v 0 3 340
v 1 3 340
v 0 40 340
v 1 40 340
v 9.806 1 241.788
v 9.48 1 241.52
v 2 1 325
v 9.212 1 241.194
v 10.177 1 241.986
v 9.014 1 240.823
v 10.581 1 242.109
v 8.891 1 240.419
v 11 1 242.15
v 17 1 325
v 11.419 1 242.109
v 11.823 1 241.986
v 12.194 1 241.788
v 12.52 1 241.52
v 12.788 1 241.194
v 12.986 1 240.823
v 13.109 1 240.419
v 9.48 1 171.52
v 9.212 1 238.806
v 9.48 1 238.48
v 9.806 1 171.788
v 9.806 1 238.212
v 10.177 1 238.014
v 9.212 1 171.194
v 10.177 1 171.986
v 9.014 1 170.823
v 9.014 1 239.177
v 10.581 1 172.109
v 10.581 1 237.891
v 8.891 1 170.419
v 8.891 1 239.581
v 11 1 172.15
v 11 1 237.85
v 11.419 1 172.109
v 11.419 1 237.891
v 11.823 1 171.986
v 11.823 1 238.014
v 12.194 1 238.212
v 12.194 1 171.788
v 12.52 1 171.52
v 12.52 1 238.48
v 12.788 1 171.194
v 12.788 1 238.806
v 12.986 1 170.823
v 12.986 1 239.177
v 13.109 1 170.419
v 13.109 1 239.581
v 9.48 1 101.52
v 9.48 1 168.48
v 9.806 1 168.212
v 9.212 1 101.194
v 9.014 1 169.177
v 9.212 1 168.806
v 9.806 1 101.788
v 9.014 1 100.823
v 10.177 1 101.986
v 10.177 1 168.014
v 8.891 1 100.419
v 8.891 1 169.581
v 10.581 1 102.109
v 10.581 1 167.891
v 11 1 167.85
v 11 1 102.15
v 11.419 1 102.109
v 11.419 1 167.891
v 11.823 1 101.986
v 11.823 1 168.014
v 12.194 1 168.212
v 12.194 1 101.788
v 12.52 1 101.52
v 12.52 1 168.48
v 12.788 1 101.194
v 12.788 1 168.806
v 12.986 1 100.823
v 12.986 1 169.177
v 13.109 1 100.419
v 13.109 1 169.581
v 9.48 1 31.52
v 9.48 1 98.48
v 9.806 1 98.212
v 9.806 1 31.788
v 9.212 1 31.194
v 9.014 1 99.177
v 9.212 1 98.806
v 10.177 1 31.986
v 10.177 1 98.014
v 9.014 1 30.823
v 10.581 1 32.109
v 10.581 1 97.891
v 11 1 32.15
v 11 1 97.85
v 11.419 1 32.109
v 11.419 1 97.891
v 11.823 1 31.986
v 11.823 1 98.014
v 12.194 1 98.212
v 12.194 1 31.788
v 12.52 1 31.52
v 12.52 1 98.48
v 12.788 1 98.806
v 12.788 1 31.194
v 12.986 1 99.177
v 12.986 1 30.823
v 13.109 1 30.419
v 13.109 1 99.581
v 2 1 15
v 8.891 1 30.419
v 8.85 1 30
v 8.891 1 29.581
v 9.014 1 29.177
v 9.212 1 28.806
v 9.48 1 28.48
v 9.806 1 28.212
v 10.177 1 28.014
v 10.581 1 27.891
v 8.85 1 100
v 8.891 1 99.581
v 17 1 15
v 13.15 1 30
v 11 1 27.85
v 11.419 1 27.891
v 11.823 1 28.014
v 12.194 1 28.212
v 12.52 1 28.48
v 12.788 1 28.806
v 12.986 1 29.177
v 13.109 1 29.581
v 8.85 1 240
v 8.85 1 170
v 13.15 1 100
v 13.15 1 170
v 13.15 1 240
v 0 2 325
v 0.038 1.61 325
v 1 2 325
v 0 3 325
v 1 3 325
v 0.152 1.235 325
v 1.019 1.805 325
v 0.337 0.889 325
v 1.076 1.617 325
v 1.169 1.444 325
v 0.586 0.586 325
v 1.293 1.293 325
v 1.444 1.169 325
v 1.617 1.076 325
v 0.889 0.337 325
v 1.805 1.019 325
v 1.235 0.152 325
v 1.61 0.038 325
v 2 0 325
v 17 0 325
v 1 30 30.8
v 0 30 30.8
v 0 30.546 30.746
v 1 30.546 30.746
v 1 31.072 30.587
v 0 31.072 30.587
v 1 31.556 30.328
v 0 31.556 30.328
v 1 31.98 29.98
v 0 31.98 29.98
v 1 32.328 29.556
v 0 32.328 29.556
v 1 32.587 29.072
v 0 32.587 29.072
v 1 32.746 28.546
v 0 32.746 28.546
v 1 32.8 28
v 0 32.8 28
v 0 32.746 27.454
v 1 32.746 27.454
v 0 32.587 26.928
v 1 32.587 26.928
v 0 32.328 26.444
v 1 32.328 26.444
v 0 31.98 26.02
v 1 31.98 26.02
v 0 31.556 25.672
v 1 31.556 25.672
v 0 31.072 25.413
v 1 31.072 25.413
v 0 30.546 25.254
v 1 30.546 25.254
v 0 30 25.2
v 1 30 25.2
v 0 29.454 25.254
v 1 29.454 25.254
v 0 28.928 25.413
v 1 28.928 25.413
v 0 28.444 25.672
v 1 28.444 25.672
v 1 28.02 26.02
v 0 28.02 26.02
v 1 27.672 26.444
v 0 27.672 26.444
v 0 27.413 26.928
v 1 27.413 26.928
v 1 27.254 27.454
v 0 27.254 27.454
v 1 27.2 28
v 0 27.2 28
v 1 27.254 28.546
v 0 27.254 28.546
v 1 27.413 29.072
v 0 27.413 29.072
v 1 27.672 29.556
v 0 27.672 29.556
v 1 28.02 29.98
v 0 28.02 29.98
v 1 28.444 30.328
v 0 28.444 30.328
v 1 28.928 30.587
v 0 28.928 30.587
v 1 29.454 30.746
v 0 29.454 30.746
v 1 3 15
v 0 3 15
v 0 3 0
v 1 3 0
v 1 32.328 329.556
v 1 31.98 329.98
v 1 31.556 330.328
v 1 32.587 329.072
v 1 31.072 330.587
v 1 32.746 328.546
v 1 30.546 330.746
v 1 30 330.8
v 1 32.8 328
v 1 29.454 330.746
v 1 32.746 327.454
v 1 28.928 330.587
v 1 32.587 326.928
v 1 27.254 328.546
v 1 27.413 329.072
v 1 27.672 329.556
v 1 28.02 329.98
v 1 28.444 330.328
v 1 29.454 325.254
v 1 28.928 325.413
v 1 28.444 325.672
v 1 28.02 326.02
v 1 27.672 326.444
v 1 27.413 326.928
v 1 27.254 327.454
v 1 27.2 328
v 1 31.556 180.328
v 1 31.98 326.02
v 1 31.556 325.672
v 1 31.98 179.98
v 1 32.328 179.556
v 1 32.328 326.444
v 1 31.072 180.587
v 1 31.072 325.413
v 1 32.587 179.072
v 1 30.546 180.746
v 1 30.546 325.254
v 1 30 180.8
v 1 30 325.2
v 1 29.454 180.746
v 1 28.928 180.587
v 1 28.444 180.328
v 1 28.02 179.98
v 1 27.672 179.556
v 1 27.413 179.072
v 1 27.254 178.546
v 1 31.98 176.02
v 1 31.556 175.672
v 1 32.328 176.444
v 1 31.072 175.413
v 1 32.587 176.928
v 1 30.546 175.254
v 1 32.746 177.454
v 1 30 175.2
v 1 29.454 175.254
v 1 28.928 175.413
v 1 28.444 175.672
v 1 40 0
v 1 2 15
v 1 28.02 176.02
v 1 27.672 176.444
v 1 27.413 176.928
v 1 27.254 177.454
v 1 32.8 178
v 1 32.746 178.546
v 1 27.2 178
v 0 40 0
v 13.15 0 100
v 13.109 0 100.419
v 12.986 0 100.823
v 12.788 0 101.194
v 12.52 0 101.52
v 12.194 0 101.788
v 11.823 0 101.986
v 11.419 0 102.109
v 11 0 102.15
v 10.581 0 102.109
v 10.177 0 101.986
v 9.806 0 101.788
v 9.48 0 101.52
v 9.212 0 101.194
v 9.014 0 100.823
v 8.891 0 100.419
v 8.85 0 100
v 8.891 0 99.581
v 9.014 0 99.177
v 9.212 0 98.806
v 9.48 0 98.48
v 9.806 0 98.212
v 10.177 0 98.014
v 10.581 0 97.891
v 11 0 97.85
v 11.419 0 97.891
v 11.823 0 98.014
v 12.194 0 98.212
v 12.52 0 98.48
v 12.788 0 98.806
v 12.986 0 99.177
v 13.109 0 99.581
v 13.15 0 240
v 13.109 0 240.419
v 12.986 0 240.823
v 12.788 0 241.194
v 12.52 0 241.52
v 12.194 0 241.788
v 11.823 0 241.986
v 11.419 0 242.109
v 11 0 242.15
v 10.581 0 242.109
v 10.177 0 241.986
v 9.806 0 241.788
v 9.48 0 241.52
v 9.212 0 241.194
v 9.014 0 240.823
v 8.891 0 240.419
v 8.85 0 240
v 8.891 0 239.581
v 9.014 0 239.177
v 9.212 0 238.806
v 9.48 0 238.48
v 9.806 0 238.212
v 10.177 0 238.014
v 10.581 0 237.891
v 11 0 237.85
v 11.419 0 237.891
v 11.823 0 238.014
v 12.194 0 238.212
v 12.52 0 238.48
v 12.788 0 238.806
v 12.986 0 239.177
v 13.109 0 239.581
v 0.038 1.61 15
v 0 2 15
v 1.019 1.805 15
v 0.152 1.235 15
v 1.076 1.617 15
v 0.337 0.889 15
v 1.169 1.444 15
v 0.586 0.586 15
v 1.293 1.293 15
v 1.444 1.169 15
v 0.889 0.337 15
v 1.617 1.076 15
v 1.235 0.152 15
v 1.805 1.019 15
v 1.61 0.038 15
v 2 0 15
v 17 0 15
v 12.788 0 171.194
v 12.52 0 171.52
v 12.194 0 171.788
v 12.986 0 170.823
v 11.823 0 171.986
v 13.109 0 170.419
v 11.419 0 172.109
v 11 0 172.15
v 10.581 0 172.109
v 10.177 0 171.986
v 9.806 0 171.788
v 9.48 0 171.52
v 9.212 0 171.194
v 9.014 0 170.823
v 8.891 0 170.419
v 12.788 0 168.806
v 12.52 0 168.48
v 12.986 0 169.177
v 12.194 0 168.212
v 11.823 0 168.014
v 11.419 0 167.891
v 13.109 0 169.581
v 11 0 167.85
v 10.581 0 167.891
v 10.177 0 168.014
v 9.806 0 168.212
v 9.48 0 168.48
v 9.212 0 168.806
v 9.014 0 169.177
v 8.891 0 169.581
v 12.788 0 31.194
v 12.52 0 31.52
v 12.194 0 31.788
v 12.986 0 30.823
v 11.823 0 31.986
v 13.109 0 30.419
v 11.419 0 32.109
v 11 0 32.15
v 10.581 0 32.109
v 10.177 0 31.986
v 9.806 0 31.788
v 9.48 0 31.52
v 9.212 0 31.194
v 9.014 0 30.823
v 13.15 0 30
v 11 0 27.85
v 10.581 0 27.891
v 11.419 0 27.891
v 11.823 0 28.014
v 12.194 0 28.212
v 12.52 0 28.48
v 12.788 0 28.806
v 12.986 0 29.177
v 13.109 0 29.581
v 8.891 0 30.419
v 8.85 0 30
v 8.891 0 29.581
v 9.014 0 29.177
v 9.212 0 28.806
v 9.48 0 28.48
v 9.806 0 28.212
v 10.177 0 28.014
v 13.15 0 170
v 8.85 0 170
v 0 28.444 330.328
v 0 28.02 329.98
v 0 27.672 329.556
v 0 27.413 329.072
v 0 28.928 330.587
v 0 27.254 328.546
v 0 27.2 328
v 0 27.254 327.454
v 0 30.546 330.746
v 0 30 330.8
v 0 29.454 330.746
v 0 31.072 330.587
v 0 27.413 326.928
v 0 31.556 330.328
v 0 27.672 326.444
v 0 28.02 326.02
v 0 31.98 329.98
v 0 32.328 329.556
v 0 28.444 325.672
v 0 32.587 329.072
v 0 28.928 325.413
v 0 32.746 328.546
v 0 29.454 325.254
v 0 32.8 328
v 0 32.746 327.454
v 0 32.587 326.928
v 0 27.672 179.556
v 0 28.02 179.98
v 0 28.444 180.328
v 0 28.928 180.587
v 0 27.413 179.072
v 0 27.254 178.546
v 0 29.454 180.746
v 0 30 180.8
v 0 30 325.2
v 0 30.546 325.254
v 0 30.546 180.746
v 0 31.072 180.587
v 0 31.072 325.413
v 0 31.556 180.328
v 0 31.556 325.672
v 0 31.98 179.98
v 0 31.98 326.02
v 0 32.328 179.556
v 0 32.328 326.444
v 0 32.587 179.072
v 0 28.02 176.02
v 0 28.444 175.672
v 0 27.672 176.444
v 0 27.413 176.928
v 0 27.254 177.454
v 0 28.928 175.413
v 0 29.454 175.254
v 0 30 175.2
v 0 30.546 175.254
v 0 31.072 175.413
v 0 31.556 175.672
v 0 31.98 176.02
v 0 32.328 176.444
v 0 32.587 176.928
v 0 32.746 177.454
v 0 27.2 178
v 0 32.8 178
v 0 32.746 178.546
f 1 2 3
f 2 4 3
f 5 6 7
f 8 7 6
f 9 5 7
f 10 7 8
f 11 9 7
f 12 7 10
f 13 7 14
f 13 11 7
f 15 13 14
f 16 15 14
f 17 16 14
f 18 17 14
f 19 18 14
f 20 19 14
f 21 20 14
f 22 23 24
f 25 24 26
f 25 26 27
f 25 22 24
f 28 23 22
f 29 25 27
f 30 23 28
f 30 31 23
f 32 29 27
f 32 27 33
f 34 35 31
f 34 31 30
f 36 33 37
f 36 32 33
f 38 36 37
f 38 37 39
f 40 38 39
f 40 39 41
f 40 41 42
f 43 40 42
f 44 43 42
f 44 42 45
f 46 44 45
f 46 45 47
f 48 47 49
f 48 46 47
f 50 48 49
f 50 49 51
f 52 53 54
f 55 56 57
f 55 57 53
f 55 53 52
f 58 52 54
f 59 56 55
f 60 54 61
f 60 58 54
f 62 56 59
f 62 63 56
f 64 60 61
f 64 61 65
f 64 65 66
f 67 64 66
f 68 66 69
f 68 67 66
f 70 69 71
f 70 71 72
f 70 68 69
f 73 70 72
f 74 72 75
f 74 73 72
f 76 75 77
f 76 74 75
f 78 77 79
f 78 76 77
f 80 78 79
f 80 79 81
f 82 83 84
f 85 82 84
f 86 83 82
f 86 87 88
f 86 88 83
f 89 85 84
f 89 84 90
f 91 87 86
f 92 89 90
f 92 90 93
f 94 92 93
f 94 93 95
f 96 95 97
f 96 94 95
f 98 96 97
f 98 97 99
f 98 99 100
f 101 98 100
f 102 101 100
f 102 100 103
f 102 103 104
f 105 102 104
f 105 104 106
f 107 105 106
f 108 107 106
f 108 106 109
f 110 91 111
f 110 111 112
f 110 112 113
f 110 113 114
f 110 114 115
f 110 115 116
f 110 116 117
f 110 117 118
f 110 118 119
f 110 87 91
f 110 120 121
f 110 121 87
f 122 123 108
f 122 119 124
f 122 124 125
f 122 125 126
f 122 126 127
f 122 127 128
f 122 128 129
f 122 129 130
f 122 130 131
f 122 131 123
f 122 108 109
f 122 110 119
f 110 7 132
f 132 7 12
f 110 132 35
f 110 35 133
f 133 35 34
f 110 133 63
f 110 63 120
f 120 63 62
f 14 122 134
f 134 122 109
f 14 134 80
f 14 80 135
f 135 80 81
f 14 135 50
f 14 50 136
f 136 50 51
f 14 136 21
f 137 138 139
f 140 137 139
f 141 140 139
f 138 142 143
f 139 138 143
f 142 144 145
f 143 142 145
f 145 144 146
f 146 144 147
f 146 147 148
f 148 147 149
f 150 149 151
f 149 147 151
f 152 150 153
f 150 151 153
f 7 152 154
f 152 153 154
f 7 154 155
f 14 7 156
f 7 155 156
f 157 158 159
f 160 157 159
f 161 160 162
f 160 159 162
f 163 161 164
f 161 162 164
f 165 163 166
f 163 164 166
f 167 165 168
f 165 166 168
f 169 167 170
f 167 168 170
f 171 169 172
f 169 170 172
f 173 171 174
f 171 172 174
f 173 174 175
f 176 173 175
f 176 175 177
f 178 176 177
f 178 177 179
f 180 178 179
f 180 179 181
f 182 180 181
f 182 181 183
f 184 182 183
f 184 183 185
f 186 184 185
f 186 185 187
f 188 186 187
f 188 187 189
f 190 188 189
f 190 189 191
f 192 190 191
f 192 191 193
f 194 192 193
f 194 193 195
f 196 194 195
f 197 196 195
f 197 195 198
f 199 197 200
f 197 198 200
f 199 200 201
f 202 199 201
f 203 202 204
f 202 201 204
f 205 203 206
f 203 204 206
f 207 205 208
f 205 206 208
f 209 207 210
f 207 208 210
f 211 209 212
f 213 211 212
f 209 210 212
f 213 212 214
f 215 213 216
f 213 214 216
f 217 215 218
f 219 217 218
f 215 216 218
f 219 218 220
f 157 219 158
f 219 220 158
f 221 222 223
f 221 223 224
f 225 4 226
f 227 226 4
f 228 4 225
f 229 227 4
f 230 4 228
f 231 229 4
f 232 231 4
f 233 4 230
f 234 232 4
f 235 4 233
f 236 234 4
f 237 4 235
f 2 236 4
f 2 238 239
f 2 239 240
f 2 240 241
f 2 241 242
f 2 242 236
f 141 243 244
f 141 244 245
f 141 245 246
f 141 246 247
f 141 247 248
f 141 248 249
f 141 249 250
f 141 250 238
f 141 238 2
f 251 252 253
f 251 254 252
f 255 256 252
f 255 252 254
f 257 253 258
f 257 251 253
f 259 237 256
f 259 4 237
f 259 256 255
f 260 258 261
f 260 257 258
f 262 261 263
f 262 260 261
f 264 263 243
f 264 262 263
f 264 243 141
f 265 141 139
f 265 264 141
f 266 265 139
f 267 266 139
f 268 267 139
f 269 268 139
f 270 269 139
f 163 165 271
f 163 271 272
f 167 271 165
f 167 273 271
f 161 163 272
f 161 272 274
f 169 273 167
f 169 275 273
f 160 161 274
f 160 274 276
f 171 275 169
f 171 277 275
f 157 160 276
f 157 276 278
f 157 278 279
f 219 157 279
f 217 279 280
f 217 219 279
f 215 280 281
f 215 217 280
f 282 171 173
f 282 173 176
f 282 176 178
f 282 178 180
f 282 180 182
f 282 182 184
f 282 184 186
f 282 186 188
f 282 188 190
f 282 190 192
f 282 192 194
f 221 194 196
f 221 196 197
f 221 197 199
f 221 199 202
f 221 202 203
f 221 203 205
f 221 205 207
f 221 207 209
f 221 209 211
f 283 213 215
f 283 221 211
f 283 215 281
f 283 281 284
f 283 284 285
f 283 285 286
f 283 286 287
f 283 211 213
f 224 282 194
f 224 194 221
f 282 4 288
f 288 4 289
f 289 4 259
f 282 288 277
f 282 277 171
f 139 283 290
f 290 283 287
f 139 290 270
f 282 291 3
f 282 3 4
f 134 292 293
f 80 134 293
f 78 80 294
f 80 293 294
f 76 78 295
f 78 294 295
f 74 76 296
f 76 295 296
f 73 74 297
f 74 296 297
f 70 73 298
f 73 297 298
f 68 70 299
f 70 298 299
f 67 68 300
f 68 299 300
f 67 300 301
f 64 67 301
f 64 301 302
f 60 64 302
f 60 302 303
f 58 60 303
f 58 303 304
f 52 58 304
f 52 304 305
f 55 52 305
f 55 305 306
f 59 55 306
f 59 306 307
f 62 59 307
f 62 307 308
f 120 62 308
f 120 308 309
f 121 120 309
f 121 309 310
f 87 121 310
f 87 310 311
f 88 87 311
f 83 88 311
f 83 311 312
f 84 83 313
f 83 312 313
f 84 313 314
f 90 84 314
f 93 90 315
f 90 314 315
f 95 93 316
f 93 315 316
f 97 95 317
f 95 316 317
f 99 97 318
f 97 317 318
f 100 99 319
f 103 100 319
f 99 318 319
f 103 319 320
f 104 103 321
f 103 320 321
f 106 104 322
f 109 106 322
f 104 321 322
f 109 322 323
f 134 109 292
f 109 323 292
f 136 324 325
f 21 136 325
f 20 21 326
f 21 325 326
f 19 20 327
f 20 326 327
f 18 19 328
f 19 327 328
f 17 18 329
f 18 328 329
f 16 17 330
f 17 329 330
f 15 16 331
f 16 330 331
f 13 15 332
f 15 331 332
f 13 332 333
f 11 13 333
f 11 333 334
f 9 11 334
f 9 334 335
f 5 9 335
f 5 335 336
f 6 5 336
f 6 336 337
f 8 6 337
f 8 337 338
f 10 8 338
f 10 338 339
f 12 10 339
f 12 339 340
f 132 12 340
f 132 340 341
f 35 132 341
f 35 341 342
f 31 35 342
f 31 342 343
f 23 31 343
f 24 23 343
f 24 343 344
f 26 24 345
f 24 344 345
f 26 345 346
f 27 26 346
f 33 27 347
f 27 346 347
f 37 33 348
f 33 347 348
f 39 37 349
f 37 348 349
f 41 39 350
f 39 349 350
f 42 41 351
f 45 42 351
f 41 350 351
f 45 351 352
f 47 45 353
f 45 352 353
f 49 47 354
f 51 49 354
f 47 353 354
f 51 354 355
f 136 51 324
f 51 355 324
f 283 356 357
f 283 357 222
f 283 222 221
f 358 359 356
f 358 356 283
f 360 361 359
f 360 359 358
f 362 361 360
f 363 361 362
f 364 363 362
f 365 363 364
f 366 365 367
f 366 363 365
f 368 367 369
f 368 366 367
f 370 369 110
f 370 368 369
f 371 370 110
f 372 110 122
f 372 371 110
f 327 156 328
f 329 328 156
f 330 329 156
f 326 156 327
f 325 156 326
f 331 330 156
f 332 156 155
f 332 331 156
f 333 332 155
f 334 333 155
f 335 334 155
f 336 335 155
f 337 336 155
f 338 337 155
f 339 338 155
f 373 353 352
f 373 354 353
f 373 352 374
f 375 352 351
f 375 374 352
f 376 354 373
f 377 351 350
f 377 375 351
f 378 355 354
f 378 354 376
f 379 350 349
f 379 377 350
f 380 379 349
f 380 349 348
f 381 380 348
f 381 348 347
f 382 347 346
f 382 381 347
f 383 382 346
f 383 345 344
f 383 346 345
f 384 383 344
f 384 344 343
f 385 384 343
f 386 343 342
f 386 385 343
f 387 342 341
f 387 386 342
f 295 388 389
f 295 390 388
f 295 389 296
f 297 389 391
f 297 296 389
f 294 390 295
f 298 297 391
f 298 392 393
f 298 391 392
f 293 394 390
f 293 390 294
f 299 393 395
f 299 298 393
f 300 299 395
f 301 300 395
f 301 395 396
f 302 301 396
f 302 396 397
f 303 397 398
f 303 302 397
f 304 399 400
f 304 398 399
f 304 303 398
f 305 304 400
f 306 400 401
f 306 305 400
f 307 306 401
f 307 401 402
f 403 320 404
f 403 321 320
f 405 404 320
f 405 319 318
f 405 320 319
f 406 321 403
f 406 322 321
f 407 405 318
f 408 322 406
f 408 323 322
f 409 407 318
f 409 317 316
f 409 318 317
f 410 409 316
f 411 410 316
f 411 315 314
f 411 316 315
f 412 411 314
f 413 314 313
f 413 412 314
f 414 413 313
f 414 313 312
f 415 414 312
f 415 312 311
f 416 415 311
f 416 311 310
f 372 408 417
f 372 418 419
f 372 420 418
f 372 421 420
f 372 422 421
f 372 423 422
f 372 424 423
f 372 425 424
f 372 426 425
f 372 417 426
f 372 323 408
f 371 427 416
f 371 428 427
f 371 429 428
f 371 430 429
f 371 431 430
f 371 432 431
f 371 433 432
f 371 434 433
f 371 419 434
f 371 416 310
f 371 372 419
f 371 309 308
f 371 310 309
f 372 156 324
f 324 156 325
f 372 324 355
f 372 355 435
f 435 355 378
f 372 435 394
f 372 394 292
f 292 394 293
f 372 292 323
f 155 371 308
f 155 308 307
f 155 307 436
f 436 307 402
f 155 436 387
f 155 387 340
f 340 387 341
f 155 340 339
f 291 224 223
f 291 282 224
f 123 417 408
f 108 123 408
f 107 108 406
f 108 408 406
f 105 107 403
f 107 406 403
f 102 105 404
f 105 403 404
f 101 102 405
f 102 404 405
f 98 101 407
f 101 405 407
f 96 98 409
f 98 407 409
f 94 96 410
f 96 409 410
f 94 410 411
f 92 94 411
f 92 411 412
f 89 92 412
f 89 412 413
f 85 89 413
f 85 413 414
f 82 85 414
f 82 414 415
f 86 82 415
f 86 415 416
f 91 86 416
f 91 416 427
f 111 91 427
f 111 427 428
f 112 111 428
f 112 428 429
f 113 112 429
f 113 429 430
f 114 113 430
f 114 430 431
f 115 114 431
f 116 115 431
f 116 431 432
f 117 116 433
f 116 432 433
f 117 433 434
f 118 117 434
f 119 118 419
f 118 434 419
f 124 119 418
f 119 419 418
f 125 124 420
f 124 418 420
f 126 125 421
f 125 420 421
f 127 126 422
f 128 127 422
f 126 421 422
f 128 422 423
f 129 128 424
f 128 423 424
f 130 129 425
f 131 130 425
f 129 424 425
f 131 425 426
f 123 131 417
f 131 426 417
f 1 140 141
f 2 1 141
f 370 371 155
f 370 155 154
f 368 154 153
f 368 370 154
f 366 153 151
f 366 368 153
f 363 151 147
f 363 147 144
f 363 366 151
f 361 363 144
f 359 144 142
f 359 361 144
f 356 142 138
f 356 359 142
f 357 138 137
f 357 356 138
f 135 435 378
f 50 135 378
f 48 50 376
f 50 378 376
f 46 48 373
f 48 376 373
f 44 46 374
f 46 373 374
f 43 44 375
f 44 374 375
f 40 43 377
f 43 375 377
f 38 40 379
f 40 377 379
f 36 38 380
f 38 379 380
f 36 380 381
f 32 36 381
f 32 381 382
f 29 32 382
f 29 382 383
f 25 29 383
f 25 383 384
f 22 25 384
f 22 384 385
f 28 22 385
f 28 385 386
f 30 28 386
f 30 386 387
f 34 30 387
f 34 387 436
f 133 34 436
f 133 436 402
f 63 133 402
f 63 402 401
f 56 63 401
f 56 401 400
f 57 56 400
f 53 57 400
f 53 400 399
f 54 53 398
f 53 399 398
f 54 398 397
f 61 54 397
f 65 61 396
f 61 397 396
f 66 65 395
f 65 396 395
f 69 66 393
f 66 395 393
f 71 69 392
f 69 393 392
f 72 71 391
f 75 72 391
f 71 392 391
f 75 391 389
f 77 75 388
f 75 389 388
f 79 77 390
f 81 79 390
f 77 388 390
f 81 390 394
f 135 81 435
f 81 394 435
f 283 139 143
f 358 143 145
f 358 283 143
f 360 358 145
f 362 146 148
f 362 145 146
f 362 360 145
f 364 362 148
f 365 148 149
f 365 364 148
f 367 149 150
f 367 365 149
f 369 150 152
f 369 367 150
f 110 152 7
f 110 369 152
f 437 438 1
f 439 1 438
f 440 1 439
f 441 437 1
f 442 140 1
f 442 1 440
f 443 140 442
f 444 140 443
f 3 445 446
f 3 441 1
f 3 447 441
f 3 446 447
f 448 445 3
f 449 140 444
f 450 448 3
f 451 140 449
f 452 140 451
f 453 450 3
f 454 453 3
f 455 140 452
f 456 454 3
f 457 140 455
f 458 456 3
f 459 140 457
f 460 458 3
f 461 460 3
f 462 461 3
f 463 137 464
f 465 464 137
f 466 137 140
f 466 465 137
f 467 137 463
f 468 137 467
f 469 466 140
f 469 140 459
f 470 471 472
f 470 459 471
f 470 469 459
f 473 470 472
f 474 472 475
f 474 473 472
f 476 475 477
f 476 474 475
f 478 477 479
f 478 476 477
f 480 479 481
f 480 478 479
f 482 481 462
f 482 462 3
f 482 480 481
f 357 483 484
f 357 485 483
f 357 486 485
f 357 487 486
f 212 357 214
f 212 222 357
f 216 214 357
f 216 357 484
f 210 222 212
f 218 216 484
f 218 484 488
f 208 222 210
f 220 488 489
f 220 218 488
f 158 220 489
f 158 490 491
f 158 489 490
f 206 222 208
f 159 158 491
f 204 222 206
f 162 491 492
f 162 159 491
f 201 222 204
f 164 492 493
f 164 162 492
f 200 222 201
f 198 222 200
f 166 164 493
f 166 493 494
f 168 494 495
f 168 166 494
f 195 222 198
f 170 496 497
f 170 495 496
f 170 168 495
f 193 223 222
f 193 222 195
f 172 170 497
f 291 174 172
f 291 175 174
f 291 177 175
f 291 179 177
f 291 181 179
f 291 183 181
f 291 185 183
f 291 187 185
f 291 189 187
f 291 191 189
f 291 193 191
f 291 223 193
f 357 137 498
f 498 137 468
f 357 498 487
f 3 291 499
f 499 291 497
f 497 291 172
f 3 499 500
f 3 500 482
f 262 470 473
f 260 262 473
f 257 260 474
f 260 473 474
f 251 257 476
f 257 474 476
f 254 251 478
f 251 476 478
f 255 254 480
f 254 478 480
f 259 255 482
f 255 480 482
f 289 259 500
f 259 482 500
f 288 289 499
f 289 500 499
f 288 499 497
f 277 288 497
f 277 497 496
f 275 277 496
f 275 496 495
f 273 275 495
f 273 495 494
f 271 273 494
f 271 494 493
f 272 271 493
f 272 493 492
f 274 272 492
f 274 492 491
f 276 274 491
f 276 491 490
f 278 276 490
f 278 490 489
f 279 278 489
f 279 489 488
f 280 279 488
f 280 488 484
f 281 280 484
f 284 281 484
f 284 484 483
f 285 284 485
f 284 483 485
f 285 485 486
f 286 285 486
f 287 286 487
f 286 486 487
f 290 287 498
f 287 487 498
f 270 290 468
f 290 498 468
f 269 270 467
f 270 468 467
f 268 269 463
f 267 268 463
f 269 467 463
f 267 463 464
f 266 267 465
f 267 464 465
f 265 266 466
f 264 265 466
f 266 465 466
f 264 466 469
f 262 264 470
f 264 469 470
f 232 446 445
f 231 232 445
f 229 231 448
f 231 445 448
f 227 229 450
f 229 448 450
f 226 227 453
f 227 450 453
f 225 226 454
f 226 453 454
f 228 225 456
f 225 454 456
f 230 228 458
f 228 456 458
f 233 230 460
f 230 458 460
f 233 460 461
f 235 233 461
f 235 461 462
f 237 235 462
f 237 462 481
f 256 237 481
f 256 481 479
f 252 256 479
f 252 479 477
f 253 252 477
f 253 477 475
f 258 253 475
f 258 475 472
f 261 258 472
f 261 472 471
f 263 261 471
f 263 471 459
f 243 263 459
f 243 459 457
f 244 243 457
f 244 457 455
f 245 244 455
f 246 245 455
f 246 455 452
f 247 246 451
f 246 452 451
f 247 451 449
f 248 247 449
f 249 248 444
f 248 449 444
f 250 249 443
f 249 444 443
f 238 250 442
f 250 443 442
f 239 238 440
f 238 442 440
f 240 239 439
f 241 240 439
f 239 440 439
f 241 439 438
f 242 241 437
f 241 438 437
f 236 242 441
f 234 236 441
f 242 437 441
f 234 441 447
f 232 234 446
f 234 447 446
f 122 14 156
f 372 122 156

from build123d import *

# Parameters (mm, degrees)
EXTRUDE_1_DEPTH     = 340
SKETCH_2_R          = 2.8
CUT_EXTRUDE_1_DEPTH = 340
SKETCH_3_R          = 2.15
CUT_EXTRUDE_2_DEPTH = 340
SKETCH_4_W          = 37.623292197
SKETCH_4_H          = 20.655925128
SKETCH_4_W_2        = 42.547460075
SKETCH_4_H_2        = 15
CUT_EXTRUDE_3_DEPTH = 3


with BuildPart() as part:
    # Эскиз1 → Вытянуть1 (new body)
    with BuildSketch(Plane.XY):
        with BuildLine():
            Line((17, 0), (2, 0))
            ThreePointArc((2, 0), (0.585786438, 0.585786438), (0, 2))
            Line((0, 2), (0, 40))
            Line((0, 40), (1, 40))
            Line((1, 40), (1, 2))
            ThreePointArc((1, 2), (1.292893219, 1.292893219), (2, 1))
            Line((2, 1), (17, 1))
            Line((17, 1), (17, 0))
        make_face()
    extrude(amount=EXTRUDE_1_DEPTH)

    # Эскиз2 → Вырез-Вытянуть1 (cut)
    with BuildSketch(Plane.ZY):
        with Locations((28, 30)):
            Circle(SKETCH_2_R)
        with Locations((178, 30)):
            Circle(SKETCH_2_R)
        with Locations((328, 30)):
            Circle(SKETCH_2_R)
    extrude(amount=-CUT_EXTRUDE_1_DEPTH, mode=Mode.SUBTRACT)

    # Эскиз3 → Вырез-Вытянуть2 (cut)
    with BuildSketch(Plane.XZ):
        with Locations((11, 30)):
            Circle(SKETCH_3_R)
        with Locations((11, 100)):
            Circle(SKETCH_3_R)
        with Locations((11, 170)):
            Circle(SKETCH_3_R)
        with Locations((11, 240)):
            Circle(SKETCH_3_R)
    extrude(amount=-CUT_EXTRUDE_2_DEPTH, mode=Mode.SUBTRACT)

    # Эскиз4 → Вырез-Вытянуть3 (cut)
    with BuildSketch(Plane.XZ):
        with Locations((6.462024168, 335.327962564)):
            Rectangle(SKETCH_4_W, SKETCH_4_H)
        with Locations((3.999940229, 7.5)):
            Rectangle(SKETCH_4_W_2, SKETCH_4_H_2)
    extrude(amount=-CUT_EXTRUDE_3_DEPTH, mode=Mode.SUBTRACT)


solid = part.part
